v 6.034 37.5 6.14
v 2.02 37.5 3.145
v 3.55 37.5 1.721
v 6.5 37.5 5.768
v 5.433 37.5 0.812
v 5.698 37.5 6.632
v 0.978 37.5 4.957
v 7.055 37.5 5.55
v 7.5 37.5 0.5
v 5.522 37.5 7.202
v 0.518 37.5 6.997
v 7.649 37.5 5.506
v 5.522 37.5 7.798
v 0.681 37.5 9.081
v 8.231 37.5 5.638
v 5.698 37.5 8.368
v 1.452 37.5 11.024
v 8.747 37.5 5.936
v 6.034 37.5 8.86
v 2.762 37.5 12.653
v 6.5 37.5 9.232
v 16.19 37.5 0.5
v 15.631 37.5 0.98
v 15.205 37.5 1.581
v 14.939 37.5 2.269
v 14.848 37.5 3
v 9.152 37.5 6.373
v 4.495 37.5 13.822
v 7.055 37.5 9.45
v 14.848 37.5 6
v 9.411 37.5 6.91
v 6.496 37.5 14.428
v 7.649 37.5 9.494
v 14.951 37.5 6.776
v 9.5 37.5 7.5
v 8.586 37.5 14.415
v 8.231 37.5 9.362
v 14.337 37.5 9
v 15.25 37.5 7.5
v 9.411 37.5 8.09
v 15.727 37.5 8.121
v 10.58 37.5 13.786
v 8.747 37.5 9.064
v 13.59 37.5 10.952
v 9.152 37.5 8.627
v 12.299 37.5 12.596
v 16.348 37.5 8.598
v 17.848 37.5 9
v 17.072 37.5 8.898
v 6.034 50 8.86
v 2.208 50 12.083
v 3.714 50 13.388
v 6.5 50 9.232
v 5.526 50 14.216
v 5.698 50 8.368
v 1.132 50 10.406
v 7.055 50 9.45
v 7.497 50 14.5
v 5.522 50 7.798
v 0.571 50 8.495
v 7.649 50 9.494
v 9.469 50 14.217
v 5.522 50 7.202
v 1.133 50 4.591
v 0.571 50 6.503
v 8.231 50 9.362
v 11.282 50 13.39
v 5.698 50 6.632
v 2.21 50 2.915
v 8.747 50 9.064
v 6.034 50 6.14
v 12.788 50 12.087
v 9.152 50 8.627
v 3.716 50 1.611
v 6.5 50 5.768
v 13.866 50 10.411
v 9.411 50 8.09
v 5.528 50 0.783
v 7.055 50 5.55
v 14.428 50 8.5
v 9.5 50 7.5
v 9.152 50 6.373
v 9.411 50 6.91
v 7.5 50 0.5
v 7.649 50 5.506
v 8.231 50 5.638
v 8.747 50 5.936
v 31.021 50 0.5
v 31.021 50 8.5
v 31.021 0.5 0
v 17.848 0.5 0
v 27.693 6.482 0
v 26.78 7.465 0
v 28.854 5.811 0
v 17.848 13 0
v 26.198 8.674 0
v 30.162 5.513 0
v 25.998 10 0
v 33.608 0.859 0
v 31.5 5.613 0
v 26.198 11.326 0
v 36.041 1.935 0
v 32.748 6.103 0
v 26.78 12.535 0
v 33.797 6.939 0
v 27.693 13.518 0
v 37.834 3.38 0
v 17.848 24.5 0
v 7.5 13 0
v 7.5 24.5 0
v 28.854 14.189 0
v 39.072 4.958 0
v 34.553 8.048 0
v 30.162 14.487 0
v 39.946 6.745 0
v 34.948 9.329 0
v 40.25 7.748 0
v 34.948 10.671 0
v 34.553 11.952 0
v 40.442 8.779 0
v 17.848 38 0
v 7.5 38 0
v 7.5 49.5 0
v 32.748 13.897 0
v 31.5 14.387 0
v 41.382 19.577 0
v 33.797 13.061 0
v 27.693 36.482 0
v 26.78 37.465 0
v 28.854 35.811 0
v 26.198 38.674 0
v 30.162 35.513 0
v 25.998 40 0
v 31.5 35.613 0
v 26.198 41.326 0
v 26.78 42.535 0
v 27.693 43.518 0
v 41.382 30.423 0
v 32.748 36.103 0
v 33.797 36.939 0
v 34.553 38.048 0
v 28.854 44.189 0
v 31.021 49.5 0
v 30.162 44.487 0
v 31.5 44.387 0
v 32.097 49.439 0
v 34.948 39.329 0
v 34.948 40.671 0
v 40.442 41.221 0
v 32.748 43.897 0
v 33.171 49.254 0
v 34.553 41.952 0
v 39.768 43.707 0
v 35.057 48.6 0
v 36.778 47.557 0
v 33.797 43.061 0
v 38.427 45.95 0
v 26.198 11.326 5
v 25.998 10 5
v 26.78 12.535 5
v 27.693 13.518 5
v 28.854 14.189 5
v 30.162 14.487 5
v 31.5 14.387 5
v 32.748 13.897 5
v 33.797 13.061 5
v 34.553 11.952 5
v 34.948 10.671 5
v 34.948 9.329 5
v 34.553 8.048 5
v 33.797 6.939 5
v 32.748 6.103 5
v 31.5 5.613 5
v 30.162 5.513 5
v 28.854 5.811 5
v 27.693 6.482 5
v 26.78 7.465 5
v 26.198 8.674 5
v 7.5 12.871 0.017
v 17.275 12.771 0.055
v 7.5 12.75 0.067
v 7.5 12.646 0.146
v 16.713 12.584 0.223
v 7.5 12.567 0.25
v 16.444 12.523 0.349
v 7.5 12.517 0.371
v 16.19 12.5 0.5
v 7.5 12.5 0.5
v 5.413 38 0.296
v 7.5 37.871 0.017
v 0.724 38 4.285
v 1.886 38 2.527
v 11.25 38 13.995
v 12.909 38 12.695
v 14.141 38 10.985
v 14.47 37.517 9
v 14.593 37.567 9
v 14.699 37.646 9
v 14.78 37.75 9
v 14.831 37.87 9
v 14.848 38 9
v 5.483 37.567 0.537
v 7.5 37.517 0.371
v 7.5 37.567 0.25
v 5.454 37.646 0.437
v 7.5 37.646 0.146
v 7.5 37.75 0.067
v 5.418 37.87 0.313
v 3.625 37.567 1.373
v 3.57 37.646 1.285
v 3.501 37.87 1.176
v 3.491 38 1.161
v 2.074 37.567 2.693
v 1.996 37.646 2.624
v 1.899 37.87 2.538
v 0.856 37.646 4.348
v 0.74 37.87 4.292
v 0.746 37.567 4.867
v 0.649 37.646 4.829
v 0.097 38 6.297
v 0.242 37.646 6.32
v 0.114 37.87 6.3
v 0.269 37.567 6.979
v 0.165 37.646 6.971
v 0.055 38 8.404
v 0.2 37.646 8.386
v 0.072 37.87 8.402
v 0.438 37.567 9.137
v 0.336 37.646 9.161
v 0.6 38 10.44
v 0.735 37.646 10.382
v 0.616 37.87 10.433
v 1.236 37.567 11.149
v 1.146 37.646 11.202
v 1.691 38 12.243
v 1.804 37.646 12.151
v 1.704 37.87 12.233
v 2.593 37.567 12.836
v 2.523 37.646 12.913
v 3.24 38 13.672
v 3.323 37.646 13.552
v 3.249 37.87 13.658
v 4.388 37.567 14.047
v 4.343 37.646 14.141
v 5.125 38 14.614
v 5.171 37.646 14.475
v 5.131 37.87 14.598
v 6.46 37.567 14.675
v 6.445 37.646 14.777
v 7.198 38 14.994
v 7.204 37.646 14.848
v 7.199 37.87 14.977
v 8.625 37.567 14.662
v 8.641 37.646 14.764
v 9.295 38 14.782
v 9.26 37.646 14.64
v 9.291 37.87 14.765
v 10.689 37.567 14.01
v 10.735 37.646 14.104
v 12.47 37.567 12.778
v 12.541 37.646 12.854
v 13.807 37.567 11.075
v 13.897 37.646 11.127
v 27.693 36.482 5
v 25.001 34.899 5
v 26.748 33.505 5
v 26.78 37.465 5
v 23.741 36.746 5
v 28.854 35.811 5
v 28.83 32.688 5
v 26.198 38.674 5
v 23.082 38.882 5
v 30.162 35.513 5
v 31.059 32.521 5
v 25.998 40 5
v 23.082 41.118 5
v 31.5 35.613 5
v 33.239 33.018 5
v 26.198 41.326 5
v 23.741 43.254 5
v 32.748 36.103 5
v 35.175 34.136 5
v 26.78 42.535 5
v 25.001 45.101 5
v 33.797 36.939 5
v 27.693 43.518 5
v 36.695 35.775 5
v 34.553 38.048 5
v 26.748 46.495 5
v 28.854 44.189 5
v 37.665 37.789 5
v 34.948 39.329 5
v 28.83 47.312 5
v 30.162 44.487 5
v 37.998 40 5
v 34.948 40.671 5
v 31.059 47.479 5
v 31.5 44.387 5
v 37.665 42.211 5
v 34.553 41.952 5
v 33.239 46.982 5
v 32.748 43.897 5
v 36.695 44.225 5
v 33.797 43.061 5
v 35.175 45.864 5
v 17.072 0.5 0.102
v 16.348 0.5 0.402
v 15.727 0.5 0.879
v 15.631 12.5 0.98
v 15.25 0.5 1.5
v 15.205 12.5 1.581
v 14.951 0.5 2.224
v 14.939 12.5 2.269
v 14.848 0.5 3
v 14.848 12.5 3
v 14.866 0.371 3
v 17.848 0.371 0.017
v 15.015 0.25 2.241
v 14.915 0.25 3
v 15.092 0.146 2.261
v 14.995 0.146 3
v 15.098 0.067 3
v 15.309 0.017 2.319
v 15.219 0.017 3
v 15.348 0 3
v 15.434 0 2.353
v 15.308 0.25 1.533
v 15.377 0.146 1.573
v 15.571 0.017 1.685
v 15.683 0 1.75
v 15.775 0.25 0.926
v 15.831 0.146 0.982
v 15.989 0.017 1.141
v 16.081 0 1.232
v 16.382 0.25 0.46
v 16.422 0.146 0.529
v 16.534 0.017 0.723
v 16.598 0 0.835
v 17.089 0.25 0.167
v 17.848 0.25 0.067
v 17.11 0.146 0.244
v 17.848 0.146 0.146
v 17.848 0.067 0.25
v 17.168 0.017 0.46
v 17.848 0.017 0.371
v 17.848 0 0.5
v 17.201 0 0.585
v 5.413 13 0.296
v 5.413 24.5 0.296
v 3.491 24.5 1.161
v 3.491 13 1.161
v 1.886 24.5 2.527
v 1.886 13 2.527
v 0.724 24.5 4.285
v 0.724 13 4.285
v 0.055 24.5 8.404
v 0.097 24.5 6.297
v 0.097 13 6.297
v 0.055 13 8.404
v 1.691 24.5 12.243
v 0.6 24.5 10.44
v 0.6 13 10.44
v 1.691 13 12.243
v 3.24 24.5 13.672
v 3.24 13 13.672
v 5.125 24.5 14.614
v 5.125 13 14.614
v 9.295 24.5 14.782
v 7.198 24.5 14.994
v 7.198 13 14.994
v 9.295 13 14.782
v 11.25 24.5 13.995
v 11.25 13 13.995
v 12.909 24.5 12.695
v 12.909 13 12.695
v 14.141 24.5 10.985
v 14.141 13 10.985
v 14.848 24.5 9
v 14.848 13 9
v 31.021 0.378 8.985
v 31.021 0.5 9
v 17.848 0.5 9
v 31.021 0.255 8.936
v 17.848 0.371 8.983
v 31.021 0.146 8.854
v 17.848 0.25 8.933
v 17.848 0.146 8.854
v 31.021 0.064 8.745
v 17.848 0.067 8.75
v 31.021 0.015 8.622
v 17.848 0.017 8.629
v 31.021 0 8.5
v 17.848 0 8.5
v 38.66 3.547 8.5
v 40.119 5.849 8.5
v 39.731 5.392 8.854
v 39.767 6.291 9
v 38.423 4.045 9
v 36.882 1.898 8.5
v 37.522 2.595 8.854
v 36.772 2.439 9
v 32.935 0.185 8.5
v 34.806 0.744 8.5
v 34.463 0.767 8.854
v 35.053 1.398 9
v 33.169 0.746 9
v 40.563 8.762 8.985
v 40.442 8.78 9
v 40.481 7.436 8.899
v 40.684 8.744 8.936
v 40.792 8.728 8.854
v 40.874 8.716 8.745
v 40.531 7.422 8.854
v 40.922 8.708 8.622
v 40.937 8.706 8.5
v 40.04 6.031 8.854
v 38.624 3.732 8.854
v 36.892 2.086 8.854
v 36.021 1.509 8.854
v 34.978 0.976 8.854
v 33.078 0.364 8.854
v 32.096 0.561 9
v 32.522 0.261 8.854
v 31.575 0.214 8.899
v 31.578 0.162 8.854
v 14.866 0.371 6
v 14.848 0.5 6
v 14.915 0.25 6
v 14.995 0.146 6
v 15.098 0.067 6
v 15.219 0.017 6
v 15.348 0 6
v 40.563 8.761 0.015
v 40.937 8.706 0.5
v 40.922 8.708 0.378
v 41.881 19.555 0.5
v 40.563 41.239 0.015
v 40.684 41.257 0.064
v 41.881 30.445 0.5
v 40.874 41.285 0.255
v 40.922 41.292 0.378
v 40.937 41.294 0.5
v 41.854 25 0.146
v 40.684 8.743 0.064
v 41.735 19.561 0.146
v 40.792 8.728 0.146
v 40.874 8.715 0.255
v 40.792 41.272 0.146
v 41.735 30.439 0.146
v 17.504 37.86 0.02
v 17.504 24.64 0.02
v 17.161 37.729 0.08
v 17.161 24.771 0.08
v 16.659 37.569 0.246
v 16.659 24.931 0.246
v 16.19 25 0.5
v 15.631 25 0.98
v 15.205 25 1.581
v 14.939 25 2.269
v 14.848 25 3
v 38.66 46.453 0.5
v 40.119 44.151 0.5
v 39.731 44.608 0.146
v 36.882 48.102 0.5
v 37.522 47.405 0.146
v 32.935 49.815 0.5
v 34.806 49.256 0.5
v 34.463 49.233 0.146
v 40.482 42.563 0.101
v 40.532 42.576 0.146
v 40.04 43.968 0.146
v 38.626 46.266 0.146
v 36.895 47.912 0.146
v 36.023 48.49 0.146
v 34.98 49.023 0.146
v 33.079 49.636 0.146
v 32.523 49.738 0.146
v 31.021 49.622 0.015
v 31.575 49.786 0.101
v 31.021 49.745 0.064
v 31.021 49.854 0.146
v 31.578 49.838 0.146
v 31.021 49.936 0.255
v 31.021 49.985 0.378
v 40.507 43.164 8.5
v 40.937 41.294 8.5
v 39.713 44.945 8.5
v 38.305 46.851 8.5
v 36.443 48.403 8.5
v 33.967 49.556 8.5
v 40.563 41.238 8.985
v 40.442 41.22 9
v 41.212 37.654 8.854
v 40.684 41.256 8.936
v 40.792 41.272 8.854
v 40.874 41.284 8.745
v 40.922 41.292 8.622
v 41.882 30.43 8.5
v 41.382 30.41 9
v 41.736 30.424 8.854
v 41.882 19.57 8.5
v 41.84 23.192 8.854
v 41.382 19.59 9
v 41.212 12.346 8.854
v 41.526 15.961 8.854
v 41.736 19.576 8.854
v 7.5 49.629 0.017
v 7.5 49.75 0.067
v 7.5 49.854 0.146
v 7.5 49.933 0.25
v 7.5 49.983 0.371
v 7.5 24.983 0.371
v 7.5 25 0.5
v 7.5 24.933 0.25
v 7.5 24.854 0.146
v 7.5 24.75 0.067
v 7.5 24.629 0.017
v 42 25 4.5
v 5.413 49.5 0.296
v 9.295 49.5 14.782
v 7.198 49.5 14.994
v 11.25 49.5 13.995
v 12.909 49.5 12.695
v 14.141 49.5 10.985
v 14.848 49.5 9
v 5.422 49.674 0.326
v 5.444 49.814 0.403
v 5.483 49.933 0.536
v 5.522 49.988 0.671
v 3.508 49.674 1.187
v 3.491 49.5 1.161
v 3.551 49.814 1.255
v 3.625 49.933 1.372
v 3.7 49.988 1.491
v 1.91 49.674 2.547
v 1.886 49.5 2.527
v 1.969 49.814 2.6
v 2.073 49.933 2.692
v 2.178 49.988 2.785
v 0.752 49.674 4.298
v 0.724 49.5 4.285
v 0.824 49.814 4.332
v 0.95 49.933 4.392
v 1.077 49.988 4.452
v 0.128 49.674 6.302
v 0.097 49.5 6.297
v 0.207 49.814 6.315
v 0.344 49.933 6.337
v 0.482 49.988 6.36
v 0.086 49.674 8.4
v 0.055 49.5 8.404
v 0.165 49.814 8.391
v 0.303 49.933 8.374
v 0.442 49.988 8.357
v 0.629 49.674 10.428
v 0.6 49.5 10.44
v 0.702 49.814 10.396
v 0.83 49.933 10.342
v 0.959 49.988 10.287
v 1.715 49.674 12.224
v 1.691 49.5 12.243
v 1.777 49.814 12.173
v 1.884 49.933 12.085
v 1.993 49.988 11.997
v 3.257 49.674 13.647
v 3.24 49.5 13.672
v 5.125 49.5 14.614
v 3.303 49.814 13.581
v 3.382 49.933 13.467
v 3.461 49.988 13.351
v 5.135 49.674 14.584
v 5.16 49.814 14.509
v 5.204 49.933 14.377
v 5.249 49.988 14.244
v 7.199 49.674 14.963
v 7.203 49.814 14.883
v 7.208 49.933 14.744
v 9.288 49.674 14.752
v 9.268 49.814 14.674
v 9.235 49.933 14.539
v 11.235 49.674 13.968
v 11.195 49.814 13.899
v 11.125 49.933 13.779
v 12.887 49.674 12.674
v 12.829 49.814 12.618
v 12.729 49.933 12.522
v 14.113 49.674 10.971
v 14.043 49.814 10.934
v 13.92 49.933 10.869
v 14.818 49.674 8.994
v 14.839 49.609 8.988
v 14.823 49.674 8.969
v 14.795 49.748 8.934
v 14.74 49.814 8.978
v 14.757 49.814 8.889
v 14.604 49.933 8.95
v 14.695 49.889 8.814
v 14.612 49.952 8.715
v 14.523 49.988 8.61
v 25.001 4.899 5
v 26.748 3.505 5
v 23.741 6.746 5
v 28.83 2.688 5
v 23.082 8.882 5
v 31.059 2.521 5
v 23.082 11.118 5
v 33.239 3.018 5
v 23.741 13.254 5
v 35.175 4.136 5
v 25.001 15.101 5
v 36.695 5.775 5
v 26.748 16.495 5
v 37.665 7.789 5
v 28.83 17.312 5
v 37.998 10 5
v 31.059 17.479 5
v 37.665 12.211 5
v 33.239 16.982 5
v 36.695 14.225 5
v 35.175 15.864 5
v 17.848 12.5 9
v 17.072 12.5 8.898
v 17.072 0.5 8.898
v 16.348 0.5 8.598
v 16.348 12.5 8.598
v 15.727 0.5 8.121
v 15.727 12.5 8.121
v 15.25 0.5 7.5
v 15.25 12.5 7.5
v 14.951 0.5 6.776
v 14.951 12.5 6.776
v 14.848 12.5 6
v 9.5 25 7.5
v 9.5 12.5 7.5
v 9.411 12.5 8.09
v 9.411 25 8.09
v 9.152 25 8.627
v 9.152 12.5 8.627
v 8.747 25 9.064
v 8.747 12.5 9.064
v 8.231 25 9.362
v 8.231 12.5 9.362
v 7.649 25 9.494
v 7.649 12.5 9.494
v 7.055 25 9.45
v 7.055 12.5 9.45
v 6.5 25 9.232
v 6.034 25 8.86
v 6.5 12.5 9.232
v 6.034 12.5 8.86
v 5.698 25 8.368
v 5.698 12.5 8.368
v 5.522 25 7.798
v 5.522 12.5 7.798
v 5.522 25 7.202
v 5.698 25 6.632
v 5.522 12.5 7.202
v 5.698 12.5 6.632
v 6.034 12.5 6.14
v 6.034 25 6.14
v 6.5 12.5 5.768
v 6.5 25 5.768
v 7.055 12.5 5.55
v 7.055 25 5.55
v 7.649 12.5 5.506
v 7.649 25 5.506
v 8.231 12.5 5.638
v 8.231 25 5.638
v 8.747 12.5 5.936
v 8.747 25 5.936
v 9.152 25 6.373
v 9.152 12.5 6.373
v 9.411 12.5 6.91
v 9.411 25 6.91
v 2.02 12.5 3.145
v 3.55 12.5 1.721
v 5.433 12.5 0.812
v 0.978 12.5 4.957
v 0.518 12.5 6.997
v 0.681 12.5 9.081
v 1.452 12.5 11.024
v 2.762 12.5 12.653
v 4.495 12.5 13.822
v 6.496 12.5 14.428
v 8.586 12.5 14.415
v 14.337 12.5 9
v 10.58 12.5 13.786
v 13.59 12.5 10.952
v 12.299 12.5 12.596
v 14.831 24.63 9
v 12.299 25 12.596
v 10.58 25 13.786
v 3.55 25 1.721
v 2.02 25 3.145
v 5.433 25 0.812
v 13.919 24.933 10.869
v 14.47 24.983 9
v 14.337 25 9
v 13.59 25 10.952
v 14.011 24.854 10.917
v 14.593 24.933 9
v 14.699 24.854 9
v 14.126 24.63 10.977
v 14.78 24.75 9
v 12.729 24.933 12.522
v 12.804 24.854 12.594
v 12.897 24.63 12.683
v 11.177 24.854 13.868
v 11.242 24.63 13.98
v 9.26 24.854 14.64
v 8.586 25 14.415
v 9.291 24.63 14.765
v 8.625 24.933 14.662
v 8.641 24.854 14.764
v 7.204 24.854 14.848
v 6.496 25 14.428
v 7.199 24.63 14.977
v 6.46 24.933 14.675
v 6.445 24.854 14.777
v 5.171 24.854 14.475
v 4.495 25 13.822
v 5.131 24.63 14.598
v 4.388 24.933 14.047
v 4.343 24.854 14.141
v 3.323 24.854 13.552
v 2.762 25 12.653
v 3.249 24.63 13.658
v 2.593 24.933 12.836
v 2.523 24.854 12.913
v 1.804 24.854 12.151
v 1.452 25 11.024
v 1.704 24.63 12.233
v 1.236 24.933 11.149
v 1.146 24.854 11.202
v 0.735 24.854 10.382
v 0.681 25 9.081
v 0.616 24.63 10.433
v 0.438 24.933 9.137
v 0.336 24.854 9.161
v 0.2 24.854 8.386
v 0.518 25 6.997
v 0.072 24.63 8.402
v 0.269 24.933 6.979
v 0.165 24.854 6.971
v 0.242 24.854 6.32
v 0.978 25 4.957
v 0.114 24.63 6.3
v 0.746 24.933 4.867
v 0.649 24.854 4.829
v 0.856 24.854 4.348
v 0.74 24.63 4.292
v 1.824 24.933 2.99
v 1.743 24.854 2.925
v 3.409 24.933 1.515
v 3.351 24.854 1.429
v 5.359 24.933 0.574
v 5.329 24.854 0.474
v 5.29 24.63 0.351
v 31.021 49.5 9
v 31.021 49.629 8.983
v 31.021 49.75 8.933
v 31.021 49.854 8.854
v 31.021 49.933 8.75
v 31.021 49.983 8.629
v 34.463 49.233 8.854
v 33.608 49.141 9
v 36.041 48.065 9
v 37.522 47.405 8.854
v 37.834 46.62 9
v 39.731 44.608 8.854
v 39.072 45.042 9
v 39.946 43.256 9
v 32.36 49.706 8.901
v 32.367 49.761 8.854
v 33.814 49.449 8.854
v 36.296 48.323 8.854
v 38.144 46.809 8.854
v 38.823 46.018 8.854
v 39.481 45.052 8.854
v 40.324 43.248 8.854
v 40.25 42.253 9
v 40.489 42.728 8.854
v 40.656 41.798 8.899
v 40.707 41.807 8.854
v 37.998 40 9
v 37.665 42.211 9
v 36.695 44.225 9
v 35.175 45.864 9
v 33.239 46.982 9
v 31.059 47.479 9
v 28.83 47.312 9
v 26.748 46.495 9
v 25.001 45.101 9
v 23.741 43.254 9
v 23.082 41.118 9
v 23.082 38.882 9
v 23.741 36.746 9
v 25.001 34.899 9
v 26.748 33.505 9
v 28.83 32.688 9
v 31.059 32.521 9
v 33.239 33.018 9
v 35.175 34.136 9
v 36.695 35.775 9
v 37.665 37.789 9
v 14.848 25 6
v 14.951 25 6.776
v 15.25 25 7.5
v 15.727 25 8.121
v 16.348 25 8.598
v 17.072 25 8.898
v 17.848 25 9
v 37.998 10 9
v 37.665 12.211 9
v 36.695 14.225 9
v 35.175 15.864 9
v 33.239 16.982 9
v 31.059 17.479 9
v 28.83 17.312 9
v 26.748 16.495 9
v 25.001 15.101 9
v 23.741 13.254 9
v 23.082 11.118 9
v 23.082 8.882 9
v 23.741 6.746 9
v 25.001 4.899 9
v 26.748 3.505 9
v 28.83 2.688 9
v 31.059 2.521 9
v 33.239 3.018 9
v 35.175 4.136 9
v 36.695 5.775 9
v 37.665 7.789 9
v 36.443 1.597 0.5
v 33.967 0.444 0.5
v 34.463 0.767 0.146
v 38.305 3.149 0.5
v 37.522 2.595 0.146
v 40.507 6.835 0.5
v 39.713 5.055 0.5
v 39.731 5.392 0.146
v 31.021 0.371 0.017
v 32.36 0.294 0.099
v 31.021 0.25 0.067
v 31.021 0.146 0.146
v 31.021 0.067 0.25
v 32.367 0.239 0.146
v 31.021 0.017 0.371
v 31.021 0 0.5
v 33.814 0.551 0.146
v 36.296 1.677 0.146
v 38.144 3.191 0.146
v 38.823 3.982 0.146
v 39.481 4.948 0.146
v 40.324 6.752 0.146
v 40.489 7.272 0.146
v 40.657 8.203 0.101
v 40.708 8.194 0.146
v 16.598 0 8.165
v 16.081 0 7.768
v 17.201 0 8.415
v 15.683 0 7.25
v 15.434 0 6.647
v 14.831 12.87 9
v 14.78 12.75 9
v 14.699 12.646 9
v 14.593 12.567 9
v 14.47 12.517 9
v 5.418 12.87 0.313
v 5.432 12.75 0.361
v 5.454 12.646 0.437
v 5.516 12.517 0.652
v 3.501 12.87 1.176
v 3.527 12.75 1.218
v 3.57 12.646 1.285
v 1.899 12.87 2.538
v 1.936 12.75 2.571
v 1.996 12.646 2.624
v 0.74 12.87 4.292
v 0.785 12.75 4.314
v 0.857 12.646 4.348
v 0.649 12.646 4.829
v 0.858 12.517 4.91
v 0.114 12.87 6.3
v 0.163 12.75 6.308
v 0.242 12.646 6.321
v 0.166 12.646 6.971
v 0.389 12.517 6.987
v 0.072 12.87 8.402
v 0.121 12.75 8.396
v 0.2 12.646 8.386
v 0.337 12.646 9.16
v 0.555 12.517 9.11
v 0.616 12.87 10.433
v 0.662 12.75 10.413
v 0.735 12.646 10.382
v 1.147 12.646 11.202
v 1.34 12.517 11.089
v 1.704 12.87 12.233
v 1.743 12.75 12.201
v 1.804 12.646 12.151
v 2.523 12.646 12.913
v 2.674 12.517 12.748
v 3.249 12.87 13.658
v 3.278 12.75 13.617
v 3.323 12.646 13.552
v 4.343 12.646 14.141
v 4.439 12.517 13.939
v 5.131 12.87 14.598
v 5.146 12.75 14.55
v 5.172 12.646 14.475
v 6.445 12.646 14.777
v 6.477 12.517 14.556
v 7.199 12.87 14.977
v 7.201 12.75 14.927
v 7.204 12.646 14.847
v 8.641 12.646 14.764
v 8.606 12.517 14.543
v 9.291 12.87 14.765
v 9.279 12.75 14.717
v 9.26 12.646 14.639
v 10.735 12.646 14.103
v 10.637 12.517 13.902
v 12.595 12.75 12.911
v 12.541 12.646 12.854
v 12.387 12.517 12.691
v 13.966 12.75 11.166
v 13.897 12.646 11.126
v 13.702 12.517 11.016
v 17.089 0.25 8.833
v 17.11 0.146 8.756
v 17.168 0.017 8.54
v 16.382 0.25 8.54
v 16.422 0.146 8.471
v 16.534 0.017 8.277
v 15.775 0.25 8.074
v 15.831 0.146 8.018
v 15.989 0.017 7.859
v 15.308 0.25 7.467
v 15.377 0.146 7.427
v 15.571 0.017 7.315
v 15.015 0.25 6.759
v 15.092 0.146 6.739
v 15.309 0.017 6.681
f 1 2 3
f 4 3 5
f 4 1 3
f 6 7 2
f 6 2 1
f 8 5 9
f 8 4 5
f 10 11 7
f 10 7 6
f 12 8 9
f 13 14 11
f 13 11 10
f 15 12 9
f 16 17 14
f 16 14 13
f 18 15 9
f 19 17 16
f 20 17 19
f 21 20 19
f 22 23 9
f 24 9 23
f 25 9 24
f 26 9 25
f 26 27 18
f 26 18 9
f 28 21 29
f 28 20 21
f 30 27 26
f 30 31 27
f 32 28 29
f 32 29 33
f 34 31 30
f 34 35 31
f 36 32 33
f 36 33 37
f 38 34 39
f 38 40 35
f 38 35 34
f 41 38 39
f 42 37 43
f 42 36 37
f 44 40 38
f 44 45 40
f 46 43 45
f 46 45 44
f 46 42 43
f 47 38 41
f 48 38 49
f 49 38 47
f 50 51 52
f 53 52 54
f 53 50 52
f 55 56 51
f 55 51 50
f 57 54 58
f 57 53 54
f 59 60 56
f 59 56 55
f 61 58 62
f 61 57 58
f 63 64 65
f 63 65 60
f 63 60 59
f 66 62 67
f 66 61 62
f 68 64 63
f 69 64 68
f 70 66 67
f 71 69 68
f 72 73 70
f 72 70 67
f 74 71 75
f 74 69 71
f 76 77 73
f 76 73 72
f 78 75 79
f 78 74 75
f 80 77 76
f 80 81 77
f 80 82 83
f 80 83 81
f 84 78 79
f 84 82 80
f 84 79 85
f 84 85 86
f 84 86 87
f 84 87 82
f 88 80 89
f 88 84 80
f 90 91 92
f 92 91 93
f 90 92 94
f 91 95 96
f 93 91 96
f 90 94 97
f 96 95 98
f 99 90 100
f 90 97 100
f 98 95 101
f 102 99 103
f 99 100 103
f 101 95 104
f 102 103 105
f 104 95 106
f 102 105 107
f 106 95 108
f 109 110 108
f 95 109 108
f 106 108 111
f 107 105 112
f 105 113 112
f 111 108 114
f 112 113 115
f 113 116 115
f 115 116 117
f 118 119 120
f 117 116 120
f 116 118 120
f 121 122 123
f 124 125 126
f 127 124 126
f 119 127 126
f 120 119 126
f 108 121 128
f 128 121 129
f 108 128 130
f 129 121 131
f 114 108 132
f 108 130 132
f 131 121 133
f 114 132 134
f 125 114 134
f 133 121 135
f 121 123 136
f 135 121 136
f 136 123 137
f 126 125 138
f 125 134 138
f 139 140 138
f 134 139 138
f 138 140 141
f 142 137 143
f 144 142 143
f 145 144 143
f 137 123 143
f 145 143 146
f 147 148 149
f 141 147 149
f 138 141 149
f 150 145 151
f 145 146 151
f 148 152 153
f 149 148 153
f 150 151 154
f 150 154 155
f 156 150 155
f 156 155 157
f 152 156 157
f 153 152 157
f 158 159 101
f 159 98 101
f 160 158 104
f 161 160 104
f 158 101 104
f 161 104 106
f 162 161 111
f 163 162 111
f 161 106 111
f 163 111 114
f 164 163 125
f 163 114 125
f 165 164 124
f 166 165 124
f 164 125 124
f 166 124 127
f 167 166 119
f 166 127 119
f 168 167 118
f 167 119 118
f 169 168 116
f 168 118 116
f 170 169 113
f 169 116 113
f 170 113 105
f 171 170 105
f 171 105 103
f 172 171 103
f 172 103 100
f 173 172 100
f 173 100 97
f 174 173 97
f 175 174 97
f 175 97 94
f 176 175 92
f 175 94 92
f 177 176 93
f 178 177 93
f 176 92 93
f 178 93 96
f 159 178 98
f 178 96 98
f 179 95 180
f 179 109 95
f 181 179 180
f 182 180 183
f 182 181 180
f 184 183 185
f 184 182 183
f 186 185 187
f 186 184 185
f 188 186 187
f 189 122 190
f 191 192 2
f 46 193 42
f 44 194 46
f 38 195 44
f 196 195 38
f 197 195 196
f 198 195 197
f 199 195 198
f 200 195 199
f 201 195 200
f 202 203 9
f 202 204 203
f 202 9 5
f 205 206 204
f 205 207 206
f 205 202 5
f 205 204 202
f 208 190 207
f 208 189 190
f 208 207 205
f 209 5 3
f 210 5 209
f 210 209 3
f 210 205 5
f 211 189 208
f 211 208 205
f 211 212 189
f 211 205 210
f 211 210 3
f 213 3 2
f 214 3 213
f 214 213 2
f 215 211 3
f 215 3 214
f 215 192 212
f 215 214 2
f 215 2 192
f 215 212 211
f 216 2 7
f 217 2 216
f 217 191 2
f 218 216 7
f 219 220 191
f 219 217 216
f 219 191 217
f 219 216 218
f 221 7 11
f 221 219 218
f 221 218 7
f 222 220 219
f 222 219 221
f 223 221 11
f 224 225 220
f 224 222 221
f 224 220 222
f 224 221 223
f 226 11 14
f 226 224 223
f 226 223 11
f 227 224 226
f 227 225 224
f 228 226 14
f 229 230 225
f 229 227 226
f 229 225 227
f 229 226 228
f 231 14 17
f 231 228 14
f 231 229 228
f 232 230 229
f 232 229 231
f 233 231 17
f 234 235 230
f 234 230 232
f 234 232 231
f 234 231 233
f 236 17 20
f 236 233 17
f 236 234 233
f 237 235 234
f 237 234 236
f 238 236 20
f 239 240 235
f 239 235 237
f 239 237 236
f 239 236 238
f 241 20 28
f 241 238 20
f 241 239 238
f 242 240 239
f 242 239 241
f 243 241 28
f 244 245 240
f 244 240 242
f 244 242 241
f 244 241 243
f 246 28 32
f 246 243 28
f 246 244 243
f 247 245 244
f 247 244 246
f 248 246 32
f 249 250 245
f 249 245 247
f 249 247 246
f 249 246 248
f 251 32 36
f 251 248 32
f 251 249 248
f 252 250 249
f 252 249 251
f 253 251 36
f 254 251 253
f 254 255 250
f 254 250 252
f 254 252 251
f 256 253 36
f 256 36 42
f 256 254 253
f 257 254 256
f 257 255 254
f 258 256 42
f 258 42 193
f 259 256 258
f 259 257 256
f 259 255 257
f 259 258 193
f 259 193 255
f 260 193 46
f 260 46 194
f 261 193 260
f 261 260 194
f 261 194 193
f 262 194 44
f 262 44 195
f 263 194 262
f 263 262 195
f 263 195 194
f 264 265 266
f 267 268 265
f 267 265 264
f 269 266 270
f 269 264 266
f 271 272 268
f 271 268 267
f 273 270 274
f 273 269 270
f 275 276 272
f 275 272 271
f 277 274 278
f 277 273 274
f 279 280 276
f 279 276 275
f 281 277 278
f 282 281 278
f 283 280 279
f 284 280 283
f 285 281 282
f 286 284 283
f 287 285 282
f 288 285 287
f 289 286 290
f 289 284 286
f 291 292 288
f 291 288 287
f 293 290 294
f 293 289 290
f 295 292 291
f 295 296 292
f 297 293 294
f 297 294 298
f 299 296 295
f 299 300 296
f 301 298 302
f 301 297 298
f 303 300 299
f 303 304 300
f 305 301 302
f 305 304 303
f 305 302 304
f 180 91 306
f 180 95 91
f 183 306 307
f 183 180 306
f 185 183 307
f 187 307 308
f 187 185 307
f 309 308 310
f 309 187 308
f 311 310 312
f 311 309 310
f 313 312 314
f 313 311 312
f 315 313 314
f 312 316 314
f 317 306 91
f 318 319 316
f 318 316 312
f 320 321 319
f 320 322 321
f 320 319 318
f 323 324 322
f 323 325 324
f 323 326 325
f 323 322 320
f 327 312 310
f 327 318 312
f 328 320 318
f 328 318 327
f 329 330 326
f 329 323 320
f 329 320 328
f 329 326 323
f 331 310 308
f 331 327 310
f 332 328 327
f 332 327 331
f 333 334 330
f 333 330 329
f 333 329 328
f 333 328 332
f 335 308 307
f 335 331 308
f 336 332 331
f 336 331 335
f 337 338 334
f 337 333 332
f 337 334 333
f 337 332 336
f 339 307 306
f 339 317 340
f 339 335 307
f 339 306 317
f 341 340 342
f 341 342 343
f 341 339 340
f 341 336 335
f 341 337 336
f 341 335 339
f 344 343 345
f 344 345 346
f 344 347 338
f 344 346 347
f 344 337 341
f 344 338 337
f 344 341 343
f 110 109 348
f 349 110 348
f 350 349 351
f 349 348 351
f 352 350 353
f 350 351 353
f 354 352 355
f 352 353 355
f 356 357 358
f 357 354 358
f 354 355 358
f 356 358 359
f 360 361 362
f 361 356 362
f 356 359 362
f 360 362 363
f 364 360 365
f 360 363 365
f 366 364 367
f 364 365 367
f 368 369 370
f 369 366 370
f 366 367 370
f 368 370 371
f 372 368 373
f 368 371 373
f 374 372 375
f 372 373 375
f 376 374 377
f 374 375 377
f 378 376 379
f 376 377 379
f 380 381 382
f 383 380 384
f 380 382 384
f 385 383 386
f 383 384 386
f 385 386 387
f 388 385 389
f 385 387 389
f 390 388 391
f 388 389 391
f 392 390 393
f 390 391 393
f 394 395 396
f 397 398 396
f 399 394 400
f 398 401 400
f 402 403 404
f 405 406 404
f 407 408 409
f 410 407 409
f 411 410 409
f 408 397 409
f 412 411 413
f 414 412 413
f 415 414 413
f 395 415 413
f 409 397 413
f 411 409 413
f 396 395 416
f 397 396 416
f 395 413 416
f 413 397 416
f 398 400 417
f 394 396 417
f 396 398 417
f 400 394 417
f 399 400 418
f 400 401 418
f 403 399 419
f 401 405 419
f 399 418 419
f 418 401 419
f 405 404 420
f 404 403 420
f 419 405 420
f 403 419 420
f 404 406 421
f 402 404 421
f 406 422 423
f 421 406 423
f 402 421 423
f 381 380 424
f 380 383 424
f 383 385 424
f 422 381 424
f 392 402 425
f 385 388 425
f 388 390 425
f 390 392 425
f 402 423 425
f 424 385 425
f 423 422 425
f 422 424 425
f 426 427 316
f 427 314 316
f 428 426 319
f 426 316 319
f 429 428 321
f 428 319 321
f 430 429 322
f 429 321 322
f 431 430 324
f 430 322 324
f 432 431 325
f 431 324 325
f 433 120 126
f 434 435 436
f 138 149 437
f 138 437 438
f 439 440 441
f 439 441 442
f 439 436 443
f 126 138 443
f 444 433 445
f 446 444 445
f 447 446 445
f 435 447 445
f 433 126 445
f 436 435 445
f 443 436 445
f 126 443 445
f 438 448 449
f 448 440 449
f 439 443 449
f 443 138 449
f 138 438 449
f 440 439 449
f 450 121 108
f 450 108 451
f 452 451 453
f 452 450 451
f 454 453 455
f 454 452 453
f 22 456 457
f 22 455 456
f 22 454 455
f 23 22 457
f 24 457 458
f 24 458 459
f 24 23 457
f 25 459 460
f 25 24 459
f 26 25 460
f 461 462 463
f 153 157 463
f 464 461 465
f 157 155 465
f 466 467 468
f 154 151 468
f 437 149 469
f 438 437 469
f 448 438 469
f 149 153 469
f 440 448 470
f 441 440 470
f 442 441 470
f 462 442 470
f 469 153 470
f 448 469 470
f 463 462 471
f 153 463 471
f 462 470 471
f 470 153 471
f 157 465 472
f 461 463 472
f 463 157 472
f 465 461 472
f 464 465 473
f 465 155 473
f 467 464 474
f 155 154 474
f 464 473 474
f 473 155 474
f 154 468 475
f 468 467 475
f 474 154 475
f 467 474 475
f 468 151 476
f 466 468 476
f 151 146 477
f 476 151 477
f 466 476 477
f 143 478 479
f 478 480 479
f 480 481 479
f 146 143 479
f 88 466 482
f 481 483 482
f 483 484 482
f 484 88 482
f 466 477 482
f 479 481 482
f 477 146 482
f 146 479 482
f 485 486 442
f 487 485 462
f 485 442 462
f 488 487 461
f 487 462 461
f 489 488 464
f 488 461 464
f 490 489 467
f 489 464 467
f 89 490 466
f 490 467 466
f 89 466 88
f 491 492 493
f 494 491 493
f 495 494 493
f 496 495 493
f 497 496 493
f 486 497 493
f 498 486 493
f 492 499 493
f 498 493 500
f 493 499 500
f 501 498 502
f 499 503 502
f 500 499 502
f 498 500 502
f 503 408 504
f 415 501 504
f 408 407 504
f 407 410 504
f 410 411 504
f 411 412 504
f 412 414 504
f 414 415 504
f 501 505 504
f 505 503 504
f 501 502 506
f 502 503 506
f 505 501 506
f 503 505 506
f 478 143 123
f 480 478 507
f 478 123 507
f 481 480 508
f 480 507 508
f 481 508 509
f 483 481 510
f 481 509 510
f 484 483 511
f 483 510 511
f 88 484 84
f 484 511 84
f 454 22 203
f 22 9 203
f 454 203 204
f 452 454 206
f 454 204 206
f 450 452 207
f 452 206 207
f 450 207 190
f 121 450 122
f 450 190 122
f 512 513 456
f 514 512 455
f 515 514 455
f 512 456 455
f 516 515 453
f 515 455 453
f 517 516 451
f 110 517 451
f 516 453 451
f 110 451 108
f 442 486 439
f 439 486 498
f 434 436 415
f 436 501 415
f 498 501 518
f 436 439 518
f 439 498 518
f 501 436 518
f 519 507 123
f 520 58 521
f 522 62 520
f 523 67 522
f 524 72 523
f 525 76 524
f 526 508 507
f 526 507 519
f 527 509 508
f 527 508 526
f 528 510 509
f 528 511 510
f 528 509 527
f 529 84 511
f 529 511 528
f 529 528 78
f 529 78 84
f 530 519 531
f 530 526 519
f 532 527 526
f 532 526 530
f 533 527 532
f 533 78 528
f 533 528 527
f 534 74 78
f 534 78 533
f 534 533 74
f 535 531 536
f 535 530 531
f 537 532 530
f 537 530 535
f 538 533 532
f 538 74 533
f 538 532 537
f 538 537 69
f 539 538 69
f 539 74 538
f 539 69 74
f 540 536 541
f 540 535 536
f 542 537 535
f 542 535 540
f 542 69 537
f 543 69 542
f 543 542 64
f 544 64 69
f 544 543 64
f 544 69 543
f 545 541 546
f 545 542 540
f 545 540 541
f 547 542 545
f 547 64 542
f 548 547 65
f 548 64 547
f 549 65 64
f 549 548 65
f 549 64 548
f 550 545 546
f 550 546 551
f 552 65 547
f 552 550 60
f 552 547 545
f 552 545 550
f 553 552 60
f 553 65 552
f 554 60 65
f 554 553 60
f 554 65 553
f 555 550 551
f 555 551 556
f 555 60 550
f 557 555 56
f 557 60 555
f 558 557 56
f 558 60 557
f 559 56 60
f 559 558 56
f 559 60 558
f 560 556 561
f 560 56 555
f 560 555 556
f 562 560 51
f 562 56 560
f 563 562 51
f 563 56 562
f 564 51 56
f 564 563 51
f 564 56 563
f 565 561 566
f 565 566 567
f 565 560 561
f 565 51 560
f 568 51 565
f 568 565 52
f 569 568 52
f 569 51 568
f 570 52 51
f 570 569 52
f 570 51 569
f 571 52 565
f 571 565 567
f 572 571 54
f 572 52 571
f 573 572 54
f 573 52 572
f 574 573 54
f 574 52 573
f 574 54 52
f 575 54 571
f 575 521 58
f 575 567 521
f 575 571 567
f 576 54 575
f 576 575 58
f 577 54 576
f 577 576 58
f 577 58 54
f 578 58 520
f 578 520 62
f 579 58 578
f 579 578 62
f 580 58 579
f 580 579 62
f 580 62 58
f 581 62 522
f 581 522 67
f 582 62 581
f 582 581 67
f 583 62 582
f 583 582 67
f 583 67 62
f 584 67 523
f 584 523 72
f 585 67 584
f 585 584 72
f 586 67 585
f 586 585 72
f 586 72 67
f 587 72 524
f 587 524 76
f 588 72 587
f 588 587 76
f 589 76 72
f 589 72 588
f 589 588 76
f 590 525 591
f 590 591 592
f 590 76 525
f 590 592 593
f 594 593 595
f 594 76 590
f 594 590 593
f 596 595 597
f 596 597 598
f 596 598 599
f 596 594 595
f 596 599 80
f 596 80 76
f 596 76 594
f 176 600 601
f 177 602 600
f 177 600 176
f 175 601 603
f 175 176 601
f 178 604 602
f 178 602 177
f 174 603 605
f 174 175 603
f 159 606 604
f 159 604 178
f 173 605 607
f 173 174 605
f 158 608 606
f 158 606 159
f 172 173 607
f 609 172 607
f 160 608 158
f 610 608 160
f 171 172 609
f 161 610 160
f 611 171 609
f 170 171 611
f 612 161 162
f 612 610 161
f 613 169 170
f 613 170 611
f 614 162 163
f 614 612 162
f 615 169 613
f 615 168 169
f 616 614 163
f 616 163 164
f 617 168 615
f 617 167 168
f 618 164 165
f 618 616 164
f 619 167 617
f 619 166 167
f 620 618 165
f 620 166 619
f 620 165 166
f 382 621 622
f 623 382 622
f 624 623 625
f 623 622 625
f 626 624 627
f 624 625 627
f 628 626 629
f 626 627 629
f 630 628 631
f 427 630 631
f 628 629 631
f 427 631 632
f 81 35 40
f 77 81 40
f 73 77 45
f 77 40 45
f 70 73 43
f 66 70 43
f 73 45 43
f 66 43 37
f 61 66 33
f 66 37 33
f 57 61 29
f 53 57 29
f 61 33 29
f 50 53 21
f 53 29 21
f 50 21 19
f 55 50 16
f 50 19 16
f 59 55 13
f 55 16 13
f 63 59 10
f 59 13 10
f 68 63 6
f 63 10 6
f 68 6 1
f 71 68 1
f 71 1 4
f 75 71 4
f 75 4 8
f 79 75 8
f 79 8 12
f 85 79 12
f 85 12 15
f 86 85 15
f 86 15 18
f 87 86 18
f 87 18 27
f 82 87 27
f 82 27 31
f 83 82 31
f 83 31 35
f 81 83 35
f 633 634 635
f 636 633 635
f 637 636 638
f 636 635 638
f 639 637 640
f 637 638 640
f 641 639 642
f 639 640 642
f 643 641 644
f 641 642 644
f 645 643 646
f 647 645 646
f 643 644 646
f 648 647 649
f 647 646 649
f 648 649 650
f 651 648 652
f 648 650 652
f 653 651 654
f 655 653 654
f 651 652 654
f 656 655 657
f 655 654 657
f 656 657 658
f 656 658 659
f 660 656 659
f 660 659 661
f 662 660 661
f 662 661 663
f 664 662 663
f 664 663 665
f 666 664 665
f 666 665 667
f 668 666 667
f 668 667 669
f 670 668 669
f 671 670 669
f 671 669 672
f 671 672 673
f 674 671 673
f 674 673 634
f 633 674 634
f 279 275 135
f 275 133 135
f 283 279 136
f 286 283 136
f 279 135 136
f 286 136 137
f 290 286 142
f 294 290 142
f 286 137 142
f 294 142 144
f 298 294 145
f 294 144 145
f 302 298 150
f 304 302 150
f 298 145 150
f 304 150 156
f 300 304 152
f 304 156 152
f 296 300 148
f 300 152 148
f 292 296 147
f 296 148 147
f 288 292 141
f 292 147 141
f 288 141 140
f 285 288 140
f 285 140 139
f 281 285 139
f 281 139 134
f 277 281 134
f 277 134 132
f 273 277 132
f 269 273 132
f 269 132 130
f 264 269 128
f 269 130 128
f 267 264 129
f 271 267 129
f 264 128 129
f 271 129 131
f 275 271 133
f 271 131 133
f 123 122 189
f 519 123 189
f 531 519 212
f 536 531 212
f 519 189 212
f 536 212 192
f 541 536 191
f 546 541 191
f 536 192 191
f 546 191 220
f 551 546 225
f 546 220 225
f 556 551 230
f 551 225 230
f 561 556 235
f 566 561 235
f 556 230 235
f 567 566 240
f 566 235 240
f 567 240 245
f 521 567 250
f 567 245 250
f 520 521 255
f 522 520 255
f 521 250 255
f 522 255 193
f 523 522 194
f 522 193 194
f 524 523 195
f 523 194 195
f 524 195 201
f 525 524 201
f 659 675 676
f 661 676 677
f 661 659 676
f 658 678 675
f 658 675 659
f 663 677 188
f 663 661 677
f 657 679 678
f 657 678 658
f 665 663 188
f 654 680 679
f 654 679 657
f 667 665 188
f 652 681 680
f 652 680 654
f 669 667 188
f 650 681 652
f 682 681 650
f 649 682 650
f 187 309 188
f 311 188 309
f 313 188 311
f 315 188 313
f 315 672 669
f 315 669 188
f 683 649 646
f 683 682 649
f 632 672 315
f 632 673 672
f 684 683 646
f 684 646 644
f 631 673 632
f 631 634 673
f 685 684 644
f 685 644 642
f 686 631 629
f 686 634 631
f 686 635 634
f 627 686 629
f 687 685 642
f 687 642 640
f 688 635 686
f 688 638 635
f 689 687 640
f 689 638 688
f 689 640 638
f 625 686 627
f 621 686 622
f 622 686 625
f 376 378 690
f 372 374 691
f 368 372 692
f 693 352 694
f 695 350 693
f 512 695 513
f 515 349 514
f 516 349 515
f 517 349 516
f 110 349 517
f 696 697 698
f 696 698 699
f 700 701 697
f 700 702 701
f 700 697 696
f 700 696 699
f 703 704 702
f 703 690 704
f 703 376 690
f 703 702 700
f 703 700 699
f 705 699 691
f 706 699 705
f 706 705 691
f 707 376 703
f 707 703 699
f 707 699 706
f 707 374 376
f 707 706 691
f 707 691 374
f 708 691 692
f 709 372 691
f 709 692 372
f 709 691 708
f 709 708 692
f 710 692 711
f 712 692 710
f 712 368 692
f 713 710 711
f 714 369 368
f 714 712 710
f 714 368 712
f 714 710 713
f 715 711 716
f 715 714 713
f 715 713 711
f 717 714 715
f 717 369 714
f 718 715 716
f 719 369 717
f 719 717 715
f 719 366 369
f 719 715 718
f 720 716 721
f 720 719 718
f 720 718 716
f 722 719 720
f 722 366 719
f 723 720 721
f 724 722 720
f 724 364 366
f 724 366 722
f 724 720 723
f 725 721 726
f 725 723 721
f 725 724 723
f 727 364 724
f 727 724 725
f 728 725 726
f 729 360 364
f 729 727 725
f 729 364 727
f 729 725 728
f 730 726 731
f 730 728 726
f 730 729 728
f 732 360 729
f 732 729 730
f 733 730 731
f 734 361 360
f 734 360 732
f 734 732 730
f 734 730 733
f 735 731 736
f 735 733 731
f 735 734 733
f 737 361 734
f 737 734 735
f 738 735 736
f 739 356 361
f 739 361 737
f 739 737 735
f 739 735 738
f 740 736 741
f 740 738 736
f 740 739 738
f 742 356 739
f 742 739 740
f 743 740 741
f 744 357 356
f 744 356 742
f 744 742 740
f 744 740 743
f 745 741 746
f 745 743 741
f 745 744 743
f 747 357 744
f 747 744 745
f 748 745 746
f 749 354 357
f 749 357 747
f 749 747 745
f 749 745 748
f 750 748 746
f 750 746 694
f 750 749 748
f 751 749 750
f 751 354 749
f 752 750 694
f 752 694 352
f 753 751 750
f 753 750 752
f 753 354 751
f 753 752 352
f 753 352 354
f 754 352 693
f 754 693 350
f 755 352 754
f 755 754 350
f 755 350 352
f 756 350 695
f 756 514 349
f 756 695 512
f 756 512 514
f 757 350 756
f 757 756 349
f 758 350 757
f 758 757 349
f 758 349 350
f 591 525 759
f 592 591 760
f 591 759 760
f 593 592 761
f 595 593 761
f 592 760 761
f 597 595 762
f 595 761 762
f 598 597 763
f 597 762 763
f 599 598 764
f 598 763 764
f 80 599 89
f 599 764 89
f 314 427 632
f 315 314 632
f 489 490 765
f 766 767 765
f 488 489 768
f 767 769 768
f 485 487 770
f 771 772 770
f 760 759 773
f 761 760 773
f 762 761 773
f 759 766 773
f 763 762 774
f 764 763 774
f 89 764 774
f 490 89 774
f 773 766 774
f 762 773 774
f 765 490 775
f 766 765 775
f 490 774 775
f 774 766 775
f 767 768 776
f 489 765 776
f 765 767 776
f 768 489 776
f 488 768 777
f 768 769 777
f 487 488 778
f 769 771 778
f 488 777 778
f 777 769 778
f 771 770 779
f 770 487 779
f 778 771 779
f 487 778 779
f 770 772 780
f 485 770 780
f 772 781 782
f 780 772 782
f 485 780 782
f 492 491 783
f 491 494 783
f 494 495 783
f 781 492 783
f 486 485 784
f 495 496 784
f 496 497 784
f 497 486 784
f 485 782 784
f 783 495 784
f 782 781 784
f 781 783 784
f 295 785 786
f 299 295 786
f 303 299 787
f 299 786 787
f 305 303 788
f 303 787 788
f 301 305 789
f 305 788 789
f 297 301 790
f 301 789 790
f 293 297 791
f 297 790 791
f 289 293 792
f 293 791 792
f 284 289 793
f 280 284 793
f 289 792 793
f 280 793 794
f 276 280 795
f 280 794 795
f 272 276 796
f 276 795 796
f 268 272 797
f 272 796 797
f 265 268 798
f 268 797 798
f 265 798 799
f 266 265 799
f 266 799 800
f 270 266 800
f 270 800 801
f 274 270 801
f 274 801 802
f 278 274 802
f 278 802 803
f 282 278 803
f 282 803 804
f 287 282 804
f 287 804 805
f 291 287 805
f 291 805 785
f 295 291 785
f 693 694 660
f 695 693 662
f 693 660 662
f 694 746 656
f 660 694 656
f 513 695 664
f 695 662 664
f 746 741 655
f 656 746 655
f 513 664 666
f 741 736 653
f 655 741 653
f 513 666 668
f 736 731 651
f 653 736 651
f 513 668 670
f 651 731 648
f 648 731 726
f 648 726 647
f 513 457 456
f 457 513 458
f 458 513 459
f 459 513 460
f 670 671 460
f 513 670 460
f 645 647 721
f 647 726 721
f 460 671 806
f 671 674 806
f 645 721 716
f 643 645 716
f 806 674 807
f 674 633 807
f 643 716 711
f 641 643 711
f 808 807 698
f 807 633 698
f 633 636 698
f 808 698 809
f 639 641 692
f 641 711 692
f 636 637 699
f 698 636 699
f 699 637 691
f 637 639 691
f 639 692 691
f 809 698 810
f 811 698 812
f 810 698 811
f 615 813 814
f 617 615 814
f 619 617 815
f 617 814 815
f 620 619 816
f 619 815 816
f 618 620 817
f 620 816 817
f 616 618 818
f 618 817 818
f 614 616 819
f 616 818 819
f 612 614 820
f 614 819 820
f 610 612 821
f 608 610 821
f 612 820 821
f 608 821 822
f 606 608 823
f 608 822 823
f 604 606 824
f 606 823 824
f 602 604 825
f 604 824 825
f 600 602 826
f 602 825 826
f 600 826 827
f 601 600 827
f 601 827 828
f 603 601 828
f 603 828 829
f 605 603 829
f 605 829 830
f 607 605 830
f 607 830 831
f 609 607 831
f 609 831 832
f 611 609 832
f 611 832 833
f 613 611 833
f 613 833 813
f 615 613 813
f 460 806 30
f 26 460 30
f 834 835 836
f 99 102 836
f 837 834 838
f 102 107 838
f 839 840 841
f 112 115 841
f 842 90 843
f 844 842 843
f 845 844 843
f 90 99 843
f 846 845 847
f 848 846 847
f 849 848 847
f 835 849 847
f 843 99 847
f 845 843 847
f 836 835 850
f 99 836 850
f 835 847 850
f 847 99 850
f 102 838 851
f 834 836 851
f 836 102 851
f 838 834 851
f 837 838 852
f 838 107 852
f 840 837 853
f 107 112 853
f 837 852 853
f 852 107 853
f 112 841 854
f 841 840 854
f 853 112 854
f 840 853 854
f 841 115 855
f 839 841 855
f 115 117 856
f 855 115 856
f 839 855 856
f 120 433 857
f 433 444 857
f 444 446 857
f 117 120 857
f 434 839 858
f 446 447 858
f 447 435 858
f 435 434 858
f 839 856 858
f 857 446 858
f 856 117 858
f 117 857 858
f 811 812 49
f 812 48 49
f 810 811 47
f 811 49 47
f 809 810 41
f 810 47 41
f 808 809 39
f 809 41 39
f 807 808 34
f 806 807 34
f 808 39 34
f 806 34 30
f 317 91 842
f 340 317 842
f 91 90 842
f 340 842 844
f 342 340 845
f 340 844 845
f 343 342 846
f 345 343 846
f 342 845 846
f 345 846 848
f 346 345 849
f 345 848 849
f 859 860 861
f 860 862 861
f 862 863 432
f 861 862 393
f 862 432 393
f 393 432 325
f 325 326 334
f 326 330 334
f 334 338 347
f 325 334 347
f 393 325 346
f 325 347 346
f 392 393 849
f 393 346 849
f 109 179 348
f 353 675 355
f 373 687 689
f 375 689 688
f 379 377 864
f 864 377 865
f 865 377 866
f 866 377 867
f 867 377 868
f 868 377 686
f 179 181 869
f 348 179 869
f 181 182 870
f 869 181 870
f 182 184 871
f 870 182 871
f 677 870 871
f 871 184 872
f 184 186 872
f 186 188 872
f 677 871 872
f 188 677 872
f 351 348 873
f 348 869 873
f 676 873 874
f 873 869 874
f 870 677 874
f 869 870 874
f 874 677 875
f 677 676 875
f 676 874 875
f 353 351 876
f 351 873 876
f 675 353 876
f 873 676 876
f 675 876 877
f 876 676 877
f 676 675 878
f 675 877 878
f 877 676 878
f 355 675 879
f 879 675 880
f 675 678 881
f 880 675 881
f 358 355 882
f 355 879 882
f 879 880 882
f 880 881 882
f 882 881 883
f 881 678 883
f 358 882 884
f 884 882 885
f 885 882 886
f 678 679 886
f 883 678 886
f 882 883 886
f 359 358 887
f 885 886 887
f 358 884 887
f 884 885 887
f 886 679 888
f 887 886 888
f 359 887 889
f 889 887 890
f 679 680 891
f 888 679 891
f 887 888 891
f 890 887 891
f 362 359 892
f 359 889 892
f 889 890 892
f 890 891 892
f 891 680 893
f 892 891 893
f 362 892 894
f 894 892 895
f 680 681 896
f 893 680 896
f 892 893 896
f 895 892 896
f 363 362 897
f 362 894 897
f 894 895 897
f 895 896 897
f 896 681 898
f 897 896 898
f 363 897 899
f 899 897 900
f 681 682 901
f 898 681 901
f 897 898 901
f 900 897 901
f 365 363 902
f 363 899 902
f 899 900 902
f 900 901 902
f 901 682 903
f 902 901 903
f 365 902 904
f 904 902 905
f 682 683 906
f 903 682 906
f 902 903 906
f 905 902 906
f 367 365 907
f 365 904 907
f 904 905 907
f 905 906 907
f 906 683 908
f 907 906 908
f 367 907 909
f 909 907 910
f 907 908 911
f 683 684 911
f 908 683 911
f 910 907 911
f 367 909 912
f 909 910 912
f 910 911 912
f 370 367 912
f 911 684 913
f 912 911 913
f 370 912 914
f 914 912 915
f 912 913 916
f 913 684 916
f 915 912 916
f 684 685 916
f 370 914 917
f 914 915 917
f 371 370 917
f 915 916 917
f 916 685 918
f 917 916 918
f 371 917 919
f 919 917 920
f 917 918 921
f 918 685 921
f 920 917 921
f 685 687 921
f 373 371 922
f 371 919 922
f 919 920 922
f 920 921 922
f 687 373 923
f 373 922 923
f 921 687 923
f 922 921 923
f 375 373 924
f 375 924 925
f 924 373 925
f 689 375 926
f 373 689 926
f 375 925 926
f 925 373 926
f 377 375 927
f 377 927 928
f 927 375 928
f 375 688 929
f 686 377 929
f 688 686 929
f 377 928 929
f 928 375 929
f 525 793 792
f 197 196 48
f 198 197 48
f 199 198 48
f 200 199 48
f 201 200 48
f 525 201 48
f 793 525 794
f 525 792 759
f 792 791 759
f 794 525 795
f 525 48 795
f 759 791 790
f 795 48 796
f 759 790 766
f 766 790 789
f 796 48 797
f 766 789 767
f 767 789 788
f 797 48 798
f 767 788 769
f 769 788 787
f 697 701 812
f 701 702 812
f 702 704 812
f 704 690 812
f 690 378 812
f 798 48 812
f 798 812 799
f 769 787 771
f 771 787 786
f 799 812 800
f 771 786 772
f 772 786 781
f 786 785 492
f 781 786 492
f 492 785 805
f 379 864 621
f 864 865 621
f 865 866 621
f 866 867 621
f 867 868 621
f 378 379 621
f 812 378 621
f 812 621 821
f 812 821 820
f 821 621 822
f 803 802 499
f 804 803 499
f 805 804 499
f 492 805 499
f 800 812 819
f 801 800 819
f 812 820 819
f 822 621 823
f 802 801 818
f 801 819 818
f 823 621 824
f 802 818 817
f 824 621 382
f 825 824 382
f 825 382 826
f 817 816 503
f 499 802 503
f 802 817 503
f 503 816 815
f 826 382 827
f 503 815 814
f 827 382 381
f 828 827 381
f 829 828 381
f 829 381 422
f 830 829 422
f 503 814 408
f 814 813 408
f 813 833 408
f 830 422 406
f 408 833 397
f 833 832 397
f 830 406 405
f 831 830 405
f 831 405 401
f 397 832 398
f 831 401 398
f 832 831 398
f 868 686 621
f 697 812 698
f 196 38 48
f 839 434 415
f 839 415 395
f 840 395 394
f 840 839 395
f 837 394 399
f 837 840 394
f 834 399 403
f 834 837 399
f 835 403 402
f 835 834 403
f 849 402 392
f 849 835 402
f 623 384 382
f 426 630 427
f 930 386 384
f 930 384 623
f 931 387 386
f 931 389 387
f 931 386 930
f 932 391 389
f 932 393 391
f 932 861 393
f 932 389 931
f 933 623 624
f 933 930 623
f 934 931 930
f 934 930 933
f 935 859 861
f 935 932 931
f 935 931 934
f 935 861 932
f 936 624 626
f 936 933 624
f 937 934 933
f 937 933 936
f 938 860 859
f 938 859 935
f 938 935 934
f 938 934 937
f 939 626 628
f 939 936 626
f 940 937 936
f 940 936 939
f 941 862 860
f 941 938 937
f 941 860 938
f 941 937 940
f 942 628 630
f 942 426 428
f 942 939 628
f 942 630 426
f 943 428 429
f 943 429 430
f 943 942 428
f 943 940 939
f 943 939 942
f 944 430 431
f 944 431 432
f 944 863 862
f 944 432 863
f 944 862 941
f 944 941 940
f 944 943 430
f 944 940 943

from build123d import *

# Parameters (mm, degrees)
SKETCH1_W                                           = 42
SKETCH1_H                                           = 50
BOSS_EXTRUDE1_DEPTH                                 = 15
SKETCH2_OUTSIDE_W                                   = 57.4
SKETCH2_OUTSIDE_H                                   = 30.4
SKETCH2_OUTSIDE_R                                   = 2
CUT_EXTRUDE1_DEPTH                                  = 51
CUT_EXTRUDE2_DEPTH                                  = 15
FILLET1_R                                           = 10
CBORE_FOR_M8_HEX_SOCKET_HEAD_CAP_SCREW1_D           = 9
CBORE_FOR_M8_HEX_SOCKET_HEAD_CAP_SCREW1_DEPTH       = 15
CBORE_FOR_M8_HEX_SOCKET_HEAD_CAP_SCREW1_CBORE_D     = 15
CBORE_FOR_M8_HEX_SOCKET_HEAD_CAP_SCREW1_CBORE_DEPTH = 4
CBORE_FOR_M8_HEX_SOCKET_HEAD_CAP_SCREW1_TIP         = 2.703872786
SKETCH6_W                                           = 14.848469228
SKETCH6_H                                           = 12.5
CUT_EXTRUDE3_DEPTH                                  = 7.0000001
CUT_EXTRUDE3_DEPTH_BACK                             = 10.0000001
FILLET2_R                                           = 3
FILLET3_R                                           = 0.5


with BuildPart() as part:
    # Sketch1 → Boss-Extrude1 (new body)
    with BuildSketch(Plane.XY):
        with Locations((21, 25)):
            Rectangle(SKETCH1_W, SKETCH1_H)
    extrude(amount=BOSS_EXTRUDE1_DEPTH)

    # Sketch2 outside → Cut-Extrude1 (cut, through all)
    with BuildSketch(Plane.XZ):
        with Locations((21, 7.5)):
            Rectangle(SKETCH2_OUTSIDE_W, SKETCH2_OUTSIDE_H)
        with BuildLine():
            Line((42, 0), (7.5, 0))
            ThreePointArc((7.5, 0), (1.690524981, 12.24341649), (14.848469228, 9))
            Line((14.848469228, 9), (42, 9))
            Line((42, 9), (42, 0))
        make_face(mode=Mode.SUBTRACT)
        with Locations((7.5, 7.5)):
            Circle(SKETCH2_OUTSIDE_R)
    extrude(amount=-CUT_EXTRUDE1_DEPTH, mode=Mode.SUBTRACT)

    # Sketch3 → Cut-Extrude2 (cut)
    with BuildSketch(Plane.XY.offset(9)):
        with BuildLine():
            Line((39.497510003, 50), (57.034840996, 50))
            Line((57.034840996, 50), (57.034840996, 0))
            Line((57.034840996, 0), (39.497510003, 0))
            add(Edge.make_bspline(
                [(39.497510003, 50), (44.502489997, 25), (39.497510003, 0)],
                knots=[0, 0, 0, 1, 1, 1], degree=2))
        make_face()
    extrude(amount=-CUT_EXTRUDE2_DEPTH, mode=Mode.SUBTRACT)

    # Fillet1
    fillet1_edges = [part.edges().sort_by_distance(p)[0] for p in [
        (39.497510003, 50, 4.5),
        (39.497510003, 0, 4.5),
    ]]
    fillet(fillet1_edges, radius=FILLET1_R)

    # CBORE for M8 Hex Socket Head Cap Screw1
    with Locations(Plane.XY.offset(9)):
        with Locations((30.498486782, 10), (30.498469228, 40)):
            CounterBoreHole(CBORE_FOR_M8_HEX_SOCKET_HEAD_CAP_SCREW1_D / 2, CBORE_FOR_M8_HEX_SOCKET_HEAD_CAP_SCREW1_CBORE_D / 2, CBORE_FOR_M8_HEX_SOCKET_HEAD_CAP_SCREW1_CBORE_DEPTH, depth=CBORE_FOR_M8_HEX_SOCKET_HEAD_CAP_SCREW1_DEPTH)
            with Locations((0, 0, -(CBORE_FOR_M8_HEX_SOCKET_HEAD_CAP_SCREW1_DEPTH + CBORE_FOR_M8_HEX_SOCKET_HEAD_CAP_SCREW1_TIP / 2))):  # 118° drill point
                Cone(0, CBORE_FOR_M8_HEX_SOCKET_HEAD_CAP_SCREW1_D / 2, CBORE_FOR_M8_HEX_SOCKET_HEAD_CAP_SCREW1_TIP, mode=Mode.SUBTRACT)

    # Sketch6 → Cut-Extrude3 (cut, two sides)
    with BuildSketch(Plane.XY.offset(9)) as cut_extrude3_sk:
        with Locations((7.424234614, 6.25)):
            Rectangle(SKETCH6_W, SKETCH6_H)
        with Locations((7.424234614, 31.25)):
            Rectangle(SKETCH6_W, SKETCH6_H)
    extrude(amount=CUT_EXTRUDE3_DEPTH, mode=Mode.SUBTRACT)
    extrude(cut_extrude3_sk.sketch, amount=-CUT_EXTRUDE3_DEPTH_BACK, mode=Mode.SUBTRACT)

    # Fillet2
    fillet2_edges = [part.edges().sort_by_distance(p)[0] for p in [
        (14.848469228, 31.25, 9),
        (14.848469228, 6.25, 9),
        (14.848469228, 6.25, 0),
        (14.848469228, 31.25, 0),
    ]]
    fillet(fillet2_edges, radius=FILLET2_R)

    # Fillet3
    fillet3_edges = [part.edges().sort_by_distance(p)[0] for p in [
        (1.690524981, 12.5, 12.24341649),
        (11.174234614, 12.5, 0),
        (1.690524981, 37.5, 12.24341649),
        (11.174234614, 37.5, 0),
        (1.690524981, 25, 12.24341649),
        (11.174234614, 25, 0),
        (24.434754493, 0, 0),
        (14.848469228, 0, 4.5),
        (15.727148885, 0, 8.121320344),
        (15.727148885, 0, 0.878679656),
        (1.690524981, 50, 12.24341649),
        (42, 25, 0),
        (42, 25, 9),
        (22.934754493, 50, 9),
        (24.434754493, 0, 9),
        (37.618828061, 2.485401574, 9),
        (37.618828061, 47.514598426, 9),
        (19.260519879, 50, 0),
        (37.618828061, 2.485401574, 0),
        (37.618828061, 47.514598426, 0),
    ]]
    fillet(fillet3_edges, radius=FILLET3_R)


solid = part.part
